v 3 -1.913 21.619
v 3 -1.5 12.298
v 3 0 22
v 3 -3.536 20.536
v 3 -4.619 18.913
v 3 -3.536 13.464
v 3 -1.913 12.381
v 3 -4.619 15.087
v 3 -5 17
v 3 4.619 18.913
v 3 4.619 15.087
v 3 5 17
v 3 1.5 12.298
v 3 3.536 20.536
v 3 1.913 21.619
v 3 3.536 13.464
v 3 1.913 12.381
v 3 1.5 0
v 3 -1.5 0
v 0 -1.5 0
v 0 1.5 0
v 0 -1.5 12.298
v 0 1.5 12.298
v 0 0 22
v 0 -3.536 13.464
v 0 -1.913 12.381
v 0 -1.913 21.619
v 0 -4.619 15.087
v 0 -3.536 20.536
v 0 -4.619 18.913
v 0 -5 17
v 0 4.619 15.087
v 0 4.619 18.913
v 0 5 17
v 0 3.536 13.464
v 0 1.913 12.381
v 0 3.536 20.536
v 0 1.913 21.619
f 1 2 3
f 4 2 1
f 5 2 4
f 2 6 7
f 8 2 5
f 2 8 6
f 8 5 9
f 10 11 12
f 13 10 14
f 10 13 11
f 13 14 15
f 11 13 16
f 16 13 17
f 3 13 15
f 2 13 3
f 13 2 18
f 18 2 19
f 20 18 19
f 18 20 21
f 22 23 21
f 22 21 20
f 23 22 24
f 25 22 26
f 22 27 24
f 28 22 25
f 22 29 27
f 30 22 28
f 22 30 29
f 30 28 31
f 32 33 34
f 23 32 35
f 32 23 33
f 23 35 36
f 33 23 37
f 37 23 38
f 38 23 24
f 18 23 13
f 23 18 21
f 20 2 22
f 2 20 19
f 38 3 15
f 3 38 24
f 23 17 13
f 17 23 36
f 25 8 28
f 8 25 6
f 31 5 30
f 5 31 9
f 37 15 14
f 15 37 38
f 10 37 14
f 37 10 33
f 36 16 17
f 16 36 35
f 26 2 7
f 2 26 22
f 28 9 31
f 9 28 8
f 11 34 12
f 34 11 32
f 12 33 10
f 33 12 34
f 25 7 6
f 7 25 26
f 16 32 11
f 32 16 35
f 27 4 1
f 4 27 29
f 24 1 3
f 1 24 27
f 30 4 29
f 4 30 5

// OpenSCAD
translate([0,-1.5,0]) cube([3,3,17]);
translate([0, 0, 17]) rotate([0, 90, 0]) cylinder(h=3, r=5);
